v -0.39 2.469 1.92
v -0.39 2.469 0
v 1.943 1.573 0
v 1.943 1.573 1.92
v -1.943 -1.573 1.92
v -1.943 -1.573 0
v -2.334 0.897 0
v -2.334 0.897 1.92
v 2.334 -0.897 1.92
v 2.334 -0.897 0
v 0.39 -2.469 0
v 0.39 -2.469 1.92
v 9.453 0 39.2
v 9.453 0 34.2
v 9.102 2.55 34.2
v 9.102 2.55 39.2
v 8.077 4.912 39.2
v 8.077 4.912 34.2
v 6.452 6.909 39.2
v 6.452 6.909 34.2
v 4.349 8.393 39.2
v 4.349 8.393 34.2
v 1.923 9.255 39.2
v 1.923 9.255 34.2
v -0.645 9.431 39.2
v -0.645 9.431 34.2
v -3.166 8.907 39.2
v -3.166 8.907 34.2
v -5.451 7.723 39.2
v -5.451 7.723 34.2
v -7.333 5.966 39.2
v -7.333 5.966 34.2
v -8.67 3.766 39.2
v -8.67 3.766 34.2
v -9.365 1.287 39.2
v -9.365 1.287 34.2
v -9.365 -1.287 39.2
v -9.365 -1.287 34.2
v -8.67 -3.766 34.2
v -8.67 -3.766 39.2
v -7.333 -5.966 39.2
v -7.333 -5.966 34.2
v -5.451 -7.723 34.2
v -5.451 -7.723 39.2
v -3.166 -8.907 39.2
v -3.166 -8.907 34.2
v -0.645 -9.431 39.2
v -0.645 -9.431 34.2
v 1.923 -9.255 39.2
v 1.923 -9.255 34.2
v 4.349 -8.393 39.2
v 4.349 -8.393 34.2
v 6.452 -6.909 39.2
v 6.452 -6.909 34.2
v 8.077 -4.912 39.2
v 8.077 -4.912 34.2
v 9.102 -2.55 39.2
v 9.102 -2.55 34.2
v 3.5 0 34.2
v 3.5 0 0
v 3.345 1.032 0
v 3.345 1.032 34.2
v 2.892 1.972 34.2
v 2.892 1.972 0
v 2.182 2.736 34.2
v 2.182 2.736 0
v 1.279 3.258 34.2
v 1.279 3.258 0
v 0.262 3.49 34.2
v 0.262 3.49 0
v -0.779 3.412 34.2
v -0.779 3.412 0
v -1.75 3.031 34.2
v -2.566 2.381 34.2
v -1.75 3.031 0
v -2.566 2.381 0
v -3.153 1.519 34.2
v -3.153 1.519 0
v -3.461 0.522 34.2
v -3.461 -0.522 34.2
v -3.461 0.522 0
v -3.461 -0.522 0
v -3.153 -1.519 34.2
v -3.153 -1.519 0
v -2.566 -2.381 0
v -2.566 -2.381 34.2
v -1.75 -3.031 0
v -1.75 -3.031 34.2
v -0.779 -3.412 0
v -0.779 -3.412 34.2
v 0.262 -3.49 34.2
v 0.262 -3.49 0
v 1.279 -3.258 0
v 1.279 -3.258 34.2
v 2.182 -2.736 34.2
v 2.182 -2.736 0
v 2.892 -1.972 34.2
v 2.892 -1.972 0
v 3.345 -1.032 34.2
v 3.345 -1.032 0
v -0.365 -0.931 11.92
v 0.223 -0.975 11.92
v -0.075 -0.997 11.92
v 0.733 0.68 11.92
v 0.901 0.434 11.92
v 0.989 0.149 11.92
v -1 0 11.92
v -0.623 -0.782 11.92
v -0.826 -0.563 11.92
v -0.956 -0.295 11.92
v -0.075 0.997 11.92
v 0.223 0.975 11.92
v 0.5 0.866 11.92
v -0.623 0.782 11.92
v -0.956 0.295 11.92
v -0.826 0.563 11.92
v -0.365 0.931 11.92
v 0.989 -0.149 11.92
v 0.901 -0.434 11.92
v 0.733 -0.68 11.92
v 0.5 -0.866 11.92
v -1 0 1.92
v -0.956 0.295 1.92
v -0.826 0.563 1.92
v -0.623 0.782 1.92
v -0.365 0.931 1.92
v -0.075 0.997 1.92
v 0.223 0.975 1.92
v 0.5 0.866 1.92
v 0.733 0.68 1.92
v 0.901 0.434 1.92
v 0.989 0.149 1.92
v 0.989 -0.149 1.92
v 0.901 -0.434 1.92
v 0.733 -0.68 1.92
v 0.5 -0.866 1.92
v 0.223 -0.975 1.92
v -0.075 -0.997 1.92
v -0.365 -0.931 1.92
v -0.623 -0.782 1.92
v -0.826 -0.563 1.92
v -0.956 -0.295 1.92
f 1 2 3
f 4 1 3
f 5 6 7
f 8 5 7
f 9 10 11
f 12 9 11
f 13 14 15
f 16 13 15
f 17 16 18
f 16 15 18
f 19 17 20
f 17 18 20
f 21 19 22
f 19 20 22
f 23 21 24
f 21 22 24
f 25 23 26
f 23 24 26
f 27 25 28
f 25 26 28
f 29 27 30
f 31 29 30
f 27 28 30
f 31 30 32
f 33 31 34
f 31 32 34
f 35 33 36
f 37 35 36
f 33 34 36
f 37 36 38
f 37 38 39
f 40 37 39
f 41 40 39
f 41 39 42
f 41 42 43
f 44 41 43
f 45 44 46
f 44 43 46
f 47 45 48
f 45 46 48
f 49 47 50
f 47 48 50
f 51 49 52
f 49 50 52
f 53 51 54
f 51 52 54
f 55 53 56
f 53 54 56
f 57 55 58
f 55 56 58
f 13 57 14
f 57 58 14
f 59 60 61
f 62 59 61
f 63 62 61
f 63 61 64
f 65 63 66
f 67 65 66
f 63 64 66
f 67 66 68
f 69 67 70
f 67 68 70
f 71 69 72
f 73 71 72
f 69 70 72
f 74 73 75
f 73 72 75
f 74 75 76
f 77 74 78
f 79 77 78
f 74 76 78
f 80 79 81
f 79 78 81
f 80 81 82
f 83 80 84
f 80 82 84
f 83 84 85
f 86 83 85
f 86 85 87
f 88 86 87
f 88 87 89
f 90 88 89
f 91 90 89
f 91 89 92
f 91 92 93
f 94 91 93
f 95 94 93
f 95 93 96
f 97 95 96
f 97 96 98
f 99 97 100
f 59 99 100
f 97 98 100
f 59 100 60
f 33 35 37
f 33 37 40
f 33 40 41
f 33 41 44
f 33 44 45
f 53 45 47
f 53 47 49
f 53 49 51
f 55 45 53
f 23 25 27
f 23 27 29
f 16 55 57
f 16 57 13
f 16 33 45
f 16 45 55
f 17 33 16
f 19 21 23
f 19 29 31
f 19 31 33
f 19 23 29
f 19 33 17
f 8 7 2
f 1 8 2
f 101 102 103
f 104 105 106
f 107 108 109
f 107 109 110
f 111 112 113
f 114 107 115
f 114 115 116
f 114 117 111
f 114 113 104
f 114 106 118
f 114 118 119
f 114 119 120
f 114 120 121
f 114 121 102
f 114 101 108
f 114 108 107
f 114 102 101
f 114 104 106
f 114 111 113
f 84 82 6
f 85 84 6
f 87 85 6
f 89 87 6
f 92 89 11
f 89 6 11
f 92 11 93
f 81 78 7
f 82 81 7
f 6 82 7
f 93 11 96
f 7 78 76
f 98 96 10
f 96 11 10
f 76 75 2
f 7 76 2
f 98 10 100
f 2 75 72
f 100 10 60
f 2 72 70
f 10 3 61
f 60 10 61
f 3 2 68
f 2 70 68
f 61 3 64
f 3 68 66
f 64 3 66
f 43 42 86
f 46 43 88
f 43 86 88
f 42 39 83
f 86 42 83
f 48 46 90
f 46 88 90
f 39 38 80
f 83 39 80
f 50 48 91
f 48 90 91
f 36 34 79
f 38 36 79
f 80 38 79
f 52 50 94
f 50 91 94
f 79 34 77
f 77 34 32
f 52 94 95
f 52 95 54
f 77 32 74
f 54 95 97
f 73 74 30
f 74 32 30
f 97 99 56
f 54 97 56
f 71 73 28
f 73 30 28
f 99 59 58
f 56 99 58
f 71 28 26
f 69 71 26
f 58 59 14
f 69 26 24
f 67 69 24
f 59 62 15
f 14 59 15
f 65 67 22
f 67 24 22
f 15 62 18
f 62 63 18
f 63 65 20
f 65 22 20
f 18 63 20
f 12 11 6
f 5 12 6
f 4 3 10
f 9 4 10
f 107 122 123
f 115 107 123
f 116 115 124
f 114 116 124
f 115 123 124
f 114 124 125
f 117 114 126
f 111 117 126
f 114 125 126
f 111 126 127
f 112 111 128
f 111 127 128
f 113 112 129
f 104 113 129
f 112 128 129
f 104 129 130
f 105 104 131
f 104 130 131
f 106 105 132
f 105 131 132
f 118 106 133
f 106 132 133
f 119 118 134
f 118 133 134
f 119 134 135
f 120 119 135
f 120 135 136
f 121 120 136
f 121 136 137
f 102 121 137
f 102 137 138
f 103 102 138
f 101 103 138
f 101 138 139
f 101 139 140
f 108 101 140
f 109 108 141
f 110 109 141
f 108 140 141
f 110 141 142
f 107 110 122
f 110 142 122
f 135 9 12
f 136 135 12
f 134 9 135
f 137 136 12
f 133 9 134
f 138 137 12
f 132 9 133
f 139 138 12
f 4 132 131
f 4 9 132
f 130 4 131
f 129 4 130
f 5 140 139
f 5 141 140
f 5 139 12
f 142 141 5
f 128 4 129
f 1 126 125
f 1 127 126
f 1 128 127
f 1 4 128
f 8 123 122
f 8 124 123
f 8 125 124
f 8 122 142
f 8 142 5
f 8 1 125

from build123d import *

# Parameters (mm, degrees)
SKETCH1_R           = 3.5
BOSS_EXTRUDE1_DEPTH = 34.2
SKETCH2_R           = 9.45299319
BOSS_EXTRUDE2_DEPTH = 5
CUT_EXTRUDE1_DEPTH  = 1.92
SKETCH4_R           = 1
CUT_EXTRUDE2_DEPTH  = 10


with BuildPart() as part:
    # Sketch1 → Boss-Extrude1 (new body)
    with BuildSketch(Plane.XY):
        Circle(SKETCH1_R)
    extrude(amount=BOSS_EXTRUDE1_DEPTH)

    # Sketch2 → Boss-Extrude2 (add)
    with BuildSketch(Plane.XY.offset(34.2)):
        Circle(SKETCH2_R)
    extrude(amount=BOSS_EXTRUDE2_DEPTH)

    # Sketch3 → Cut-Extrude1 (cut)
    with BuildSketch(Plane(origin=(0, 0, 0), x_dir=(-1, 0, 0), z_dir=(0, 0, -1))):
        Polygon((-1.943409889, 1.572627739), (-2.333640517, -0.896728464), (-0.390230628, -2.469356203), (1.943409889, -1.572627739), (2.333640517, 0.896728464), (0.390230628, 2.469356203), align=None)
    extrude(amount=-CUT_EXTRUDE1_DEPTH, mode=Mode.SUBTRACT)

    # Sketch4 → Cut-Extrude2 (cut)
    with BuildSketch(Plane(origin=(0, 0, 1.92), x_dir=(-1, 0, 0), z_dir=(0, 0, -1))):
        Circle(SKETCH4_R)
    extrude(amount=-CUT_EXTRUDE2_DEPTH, mode=Mode.SUBTRACT)


solid = part.part
